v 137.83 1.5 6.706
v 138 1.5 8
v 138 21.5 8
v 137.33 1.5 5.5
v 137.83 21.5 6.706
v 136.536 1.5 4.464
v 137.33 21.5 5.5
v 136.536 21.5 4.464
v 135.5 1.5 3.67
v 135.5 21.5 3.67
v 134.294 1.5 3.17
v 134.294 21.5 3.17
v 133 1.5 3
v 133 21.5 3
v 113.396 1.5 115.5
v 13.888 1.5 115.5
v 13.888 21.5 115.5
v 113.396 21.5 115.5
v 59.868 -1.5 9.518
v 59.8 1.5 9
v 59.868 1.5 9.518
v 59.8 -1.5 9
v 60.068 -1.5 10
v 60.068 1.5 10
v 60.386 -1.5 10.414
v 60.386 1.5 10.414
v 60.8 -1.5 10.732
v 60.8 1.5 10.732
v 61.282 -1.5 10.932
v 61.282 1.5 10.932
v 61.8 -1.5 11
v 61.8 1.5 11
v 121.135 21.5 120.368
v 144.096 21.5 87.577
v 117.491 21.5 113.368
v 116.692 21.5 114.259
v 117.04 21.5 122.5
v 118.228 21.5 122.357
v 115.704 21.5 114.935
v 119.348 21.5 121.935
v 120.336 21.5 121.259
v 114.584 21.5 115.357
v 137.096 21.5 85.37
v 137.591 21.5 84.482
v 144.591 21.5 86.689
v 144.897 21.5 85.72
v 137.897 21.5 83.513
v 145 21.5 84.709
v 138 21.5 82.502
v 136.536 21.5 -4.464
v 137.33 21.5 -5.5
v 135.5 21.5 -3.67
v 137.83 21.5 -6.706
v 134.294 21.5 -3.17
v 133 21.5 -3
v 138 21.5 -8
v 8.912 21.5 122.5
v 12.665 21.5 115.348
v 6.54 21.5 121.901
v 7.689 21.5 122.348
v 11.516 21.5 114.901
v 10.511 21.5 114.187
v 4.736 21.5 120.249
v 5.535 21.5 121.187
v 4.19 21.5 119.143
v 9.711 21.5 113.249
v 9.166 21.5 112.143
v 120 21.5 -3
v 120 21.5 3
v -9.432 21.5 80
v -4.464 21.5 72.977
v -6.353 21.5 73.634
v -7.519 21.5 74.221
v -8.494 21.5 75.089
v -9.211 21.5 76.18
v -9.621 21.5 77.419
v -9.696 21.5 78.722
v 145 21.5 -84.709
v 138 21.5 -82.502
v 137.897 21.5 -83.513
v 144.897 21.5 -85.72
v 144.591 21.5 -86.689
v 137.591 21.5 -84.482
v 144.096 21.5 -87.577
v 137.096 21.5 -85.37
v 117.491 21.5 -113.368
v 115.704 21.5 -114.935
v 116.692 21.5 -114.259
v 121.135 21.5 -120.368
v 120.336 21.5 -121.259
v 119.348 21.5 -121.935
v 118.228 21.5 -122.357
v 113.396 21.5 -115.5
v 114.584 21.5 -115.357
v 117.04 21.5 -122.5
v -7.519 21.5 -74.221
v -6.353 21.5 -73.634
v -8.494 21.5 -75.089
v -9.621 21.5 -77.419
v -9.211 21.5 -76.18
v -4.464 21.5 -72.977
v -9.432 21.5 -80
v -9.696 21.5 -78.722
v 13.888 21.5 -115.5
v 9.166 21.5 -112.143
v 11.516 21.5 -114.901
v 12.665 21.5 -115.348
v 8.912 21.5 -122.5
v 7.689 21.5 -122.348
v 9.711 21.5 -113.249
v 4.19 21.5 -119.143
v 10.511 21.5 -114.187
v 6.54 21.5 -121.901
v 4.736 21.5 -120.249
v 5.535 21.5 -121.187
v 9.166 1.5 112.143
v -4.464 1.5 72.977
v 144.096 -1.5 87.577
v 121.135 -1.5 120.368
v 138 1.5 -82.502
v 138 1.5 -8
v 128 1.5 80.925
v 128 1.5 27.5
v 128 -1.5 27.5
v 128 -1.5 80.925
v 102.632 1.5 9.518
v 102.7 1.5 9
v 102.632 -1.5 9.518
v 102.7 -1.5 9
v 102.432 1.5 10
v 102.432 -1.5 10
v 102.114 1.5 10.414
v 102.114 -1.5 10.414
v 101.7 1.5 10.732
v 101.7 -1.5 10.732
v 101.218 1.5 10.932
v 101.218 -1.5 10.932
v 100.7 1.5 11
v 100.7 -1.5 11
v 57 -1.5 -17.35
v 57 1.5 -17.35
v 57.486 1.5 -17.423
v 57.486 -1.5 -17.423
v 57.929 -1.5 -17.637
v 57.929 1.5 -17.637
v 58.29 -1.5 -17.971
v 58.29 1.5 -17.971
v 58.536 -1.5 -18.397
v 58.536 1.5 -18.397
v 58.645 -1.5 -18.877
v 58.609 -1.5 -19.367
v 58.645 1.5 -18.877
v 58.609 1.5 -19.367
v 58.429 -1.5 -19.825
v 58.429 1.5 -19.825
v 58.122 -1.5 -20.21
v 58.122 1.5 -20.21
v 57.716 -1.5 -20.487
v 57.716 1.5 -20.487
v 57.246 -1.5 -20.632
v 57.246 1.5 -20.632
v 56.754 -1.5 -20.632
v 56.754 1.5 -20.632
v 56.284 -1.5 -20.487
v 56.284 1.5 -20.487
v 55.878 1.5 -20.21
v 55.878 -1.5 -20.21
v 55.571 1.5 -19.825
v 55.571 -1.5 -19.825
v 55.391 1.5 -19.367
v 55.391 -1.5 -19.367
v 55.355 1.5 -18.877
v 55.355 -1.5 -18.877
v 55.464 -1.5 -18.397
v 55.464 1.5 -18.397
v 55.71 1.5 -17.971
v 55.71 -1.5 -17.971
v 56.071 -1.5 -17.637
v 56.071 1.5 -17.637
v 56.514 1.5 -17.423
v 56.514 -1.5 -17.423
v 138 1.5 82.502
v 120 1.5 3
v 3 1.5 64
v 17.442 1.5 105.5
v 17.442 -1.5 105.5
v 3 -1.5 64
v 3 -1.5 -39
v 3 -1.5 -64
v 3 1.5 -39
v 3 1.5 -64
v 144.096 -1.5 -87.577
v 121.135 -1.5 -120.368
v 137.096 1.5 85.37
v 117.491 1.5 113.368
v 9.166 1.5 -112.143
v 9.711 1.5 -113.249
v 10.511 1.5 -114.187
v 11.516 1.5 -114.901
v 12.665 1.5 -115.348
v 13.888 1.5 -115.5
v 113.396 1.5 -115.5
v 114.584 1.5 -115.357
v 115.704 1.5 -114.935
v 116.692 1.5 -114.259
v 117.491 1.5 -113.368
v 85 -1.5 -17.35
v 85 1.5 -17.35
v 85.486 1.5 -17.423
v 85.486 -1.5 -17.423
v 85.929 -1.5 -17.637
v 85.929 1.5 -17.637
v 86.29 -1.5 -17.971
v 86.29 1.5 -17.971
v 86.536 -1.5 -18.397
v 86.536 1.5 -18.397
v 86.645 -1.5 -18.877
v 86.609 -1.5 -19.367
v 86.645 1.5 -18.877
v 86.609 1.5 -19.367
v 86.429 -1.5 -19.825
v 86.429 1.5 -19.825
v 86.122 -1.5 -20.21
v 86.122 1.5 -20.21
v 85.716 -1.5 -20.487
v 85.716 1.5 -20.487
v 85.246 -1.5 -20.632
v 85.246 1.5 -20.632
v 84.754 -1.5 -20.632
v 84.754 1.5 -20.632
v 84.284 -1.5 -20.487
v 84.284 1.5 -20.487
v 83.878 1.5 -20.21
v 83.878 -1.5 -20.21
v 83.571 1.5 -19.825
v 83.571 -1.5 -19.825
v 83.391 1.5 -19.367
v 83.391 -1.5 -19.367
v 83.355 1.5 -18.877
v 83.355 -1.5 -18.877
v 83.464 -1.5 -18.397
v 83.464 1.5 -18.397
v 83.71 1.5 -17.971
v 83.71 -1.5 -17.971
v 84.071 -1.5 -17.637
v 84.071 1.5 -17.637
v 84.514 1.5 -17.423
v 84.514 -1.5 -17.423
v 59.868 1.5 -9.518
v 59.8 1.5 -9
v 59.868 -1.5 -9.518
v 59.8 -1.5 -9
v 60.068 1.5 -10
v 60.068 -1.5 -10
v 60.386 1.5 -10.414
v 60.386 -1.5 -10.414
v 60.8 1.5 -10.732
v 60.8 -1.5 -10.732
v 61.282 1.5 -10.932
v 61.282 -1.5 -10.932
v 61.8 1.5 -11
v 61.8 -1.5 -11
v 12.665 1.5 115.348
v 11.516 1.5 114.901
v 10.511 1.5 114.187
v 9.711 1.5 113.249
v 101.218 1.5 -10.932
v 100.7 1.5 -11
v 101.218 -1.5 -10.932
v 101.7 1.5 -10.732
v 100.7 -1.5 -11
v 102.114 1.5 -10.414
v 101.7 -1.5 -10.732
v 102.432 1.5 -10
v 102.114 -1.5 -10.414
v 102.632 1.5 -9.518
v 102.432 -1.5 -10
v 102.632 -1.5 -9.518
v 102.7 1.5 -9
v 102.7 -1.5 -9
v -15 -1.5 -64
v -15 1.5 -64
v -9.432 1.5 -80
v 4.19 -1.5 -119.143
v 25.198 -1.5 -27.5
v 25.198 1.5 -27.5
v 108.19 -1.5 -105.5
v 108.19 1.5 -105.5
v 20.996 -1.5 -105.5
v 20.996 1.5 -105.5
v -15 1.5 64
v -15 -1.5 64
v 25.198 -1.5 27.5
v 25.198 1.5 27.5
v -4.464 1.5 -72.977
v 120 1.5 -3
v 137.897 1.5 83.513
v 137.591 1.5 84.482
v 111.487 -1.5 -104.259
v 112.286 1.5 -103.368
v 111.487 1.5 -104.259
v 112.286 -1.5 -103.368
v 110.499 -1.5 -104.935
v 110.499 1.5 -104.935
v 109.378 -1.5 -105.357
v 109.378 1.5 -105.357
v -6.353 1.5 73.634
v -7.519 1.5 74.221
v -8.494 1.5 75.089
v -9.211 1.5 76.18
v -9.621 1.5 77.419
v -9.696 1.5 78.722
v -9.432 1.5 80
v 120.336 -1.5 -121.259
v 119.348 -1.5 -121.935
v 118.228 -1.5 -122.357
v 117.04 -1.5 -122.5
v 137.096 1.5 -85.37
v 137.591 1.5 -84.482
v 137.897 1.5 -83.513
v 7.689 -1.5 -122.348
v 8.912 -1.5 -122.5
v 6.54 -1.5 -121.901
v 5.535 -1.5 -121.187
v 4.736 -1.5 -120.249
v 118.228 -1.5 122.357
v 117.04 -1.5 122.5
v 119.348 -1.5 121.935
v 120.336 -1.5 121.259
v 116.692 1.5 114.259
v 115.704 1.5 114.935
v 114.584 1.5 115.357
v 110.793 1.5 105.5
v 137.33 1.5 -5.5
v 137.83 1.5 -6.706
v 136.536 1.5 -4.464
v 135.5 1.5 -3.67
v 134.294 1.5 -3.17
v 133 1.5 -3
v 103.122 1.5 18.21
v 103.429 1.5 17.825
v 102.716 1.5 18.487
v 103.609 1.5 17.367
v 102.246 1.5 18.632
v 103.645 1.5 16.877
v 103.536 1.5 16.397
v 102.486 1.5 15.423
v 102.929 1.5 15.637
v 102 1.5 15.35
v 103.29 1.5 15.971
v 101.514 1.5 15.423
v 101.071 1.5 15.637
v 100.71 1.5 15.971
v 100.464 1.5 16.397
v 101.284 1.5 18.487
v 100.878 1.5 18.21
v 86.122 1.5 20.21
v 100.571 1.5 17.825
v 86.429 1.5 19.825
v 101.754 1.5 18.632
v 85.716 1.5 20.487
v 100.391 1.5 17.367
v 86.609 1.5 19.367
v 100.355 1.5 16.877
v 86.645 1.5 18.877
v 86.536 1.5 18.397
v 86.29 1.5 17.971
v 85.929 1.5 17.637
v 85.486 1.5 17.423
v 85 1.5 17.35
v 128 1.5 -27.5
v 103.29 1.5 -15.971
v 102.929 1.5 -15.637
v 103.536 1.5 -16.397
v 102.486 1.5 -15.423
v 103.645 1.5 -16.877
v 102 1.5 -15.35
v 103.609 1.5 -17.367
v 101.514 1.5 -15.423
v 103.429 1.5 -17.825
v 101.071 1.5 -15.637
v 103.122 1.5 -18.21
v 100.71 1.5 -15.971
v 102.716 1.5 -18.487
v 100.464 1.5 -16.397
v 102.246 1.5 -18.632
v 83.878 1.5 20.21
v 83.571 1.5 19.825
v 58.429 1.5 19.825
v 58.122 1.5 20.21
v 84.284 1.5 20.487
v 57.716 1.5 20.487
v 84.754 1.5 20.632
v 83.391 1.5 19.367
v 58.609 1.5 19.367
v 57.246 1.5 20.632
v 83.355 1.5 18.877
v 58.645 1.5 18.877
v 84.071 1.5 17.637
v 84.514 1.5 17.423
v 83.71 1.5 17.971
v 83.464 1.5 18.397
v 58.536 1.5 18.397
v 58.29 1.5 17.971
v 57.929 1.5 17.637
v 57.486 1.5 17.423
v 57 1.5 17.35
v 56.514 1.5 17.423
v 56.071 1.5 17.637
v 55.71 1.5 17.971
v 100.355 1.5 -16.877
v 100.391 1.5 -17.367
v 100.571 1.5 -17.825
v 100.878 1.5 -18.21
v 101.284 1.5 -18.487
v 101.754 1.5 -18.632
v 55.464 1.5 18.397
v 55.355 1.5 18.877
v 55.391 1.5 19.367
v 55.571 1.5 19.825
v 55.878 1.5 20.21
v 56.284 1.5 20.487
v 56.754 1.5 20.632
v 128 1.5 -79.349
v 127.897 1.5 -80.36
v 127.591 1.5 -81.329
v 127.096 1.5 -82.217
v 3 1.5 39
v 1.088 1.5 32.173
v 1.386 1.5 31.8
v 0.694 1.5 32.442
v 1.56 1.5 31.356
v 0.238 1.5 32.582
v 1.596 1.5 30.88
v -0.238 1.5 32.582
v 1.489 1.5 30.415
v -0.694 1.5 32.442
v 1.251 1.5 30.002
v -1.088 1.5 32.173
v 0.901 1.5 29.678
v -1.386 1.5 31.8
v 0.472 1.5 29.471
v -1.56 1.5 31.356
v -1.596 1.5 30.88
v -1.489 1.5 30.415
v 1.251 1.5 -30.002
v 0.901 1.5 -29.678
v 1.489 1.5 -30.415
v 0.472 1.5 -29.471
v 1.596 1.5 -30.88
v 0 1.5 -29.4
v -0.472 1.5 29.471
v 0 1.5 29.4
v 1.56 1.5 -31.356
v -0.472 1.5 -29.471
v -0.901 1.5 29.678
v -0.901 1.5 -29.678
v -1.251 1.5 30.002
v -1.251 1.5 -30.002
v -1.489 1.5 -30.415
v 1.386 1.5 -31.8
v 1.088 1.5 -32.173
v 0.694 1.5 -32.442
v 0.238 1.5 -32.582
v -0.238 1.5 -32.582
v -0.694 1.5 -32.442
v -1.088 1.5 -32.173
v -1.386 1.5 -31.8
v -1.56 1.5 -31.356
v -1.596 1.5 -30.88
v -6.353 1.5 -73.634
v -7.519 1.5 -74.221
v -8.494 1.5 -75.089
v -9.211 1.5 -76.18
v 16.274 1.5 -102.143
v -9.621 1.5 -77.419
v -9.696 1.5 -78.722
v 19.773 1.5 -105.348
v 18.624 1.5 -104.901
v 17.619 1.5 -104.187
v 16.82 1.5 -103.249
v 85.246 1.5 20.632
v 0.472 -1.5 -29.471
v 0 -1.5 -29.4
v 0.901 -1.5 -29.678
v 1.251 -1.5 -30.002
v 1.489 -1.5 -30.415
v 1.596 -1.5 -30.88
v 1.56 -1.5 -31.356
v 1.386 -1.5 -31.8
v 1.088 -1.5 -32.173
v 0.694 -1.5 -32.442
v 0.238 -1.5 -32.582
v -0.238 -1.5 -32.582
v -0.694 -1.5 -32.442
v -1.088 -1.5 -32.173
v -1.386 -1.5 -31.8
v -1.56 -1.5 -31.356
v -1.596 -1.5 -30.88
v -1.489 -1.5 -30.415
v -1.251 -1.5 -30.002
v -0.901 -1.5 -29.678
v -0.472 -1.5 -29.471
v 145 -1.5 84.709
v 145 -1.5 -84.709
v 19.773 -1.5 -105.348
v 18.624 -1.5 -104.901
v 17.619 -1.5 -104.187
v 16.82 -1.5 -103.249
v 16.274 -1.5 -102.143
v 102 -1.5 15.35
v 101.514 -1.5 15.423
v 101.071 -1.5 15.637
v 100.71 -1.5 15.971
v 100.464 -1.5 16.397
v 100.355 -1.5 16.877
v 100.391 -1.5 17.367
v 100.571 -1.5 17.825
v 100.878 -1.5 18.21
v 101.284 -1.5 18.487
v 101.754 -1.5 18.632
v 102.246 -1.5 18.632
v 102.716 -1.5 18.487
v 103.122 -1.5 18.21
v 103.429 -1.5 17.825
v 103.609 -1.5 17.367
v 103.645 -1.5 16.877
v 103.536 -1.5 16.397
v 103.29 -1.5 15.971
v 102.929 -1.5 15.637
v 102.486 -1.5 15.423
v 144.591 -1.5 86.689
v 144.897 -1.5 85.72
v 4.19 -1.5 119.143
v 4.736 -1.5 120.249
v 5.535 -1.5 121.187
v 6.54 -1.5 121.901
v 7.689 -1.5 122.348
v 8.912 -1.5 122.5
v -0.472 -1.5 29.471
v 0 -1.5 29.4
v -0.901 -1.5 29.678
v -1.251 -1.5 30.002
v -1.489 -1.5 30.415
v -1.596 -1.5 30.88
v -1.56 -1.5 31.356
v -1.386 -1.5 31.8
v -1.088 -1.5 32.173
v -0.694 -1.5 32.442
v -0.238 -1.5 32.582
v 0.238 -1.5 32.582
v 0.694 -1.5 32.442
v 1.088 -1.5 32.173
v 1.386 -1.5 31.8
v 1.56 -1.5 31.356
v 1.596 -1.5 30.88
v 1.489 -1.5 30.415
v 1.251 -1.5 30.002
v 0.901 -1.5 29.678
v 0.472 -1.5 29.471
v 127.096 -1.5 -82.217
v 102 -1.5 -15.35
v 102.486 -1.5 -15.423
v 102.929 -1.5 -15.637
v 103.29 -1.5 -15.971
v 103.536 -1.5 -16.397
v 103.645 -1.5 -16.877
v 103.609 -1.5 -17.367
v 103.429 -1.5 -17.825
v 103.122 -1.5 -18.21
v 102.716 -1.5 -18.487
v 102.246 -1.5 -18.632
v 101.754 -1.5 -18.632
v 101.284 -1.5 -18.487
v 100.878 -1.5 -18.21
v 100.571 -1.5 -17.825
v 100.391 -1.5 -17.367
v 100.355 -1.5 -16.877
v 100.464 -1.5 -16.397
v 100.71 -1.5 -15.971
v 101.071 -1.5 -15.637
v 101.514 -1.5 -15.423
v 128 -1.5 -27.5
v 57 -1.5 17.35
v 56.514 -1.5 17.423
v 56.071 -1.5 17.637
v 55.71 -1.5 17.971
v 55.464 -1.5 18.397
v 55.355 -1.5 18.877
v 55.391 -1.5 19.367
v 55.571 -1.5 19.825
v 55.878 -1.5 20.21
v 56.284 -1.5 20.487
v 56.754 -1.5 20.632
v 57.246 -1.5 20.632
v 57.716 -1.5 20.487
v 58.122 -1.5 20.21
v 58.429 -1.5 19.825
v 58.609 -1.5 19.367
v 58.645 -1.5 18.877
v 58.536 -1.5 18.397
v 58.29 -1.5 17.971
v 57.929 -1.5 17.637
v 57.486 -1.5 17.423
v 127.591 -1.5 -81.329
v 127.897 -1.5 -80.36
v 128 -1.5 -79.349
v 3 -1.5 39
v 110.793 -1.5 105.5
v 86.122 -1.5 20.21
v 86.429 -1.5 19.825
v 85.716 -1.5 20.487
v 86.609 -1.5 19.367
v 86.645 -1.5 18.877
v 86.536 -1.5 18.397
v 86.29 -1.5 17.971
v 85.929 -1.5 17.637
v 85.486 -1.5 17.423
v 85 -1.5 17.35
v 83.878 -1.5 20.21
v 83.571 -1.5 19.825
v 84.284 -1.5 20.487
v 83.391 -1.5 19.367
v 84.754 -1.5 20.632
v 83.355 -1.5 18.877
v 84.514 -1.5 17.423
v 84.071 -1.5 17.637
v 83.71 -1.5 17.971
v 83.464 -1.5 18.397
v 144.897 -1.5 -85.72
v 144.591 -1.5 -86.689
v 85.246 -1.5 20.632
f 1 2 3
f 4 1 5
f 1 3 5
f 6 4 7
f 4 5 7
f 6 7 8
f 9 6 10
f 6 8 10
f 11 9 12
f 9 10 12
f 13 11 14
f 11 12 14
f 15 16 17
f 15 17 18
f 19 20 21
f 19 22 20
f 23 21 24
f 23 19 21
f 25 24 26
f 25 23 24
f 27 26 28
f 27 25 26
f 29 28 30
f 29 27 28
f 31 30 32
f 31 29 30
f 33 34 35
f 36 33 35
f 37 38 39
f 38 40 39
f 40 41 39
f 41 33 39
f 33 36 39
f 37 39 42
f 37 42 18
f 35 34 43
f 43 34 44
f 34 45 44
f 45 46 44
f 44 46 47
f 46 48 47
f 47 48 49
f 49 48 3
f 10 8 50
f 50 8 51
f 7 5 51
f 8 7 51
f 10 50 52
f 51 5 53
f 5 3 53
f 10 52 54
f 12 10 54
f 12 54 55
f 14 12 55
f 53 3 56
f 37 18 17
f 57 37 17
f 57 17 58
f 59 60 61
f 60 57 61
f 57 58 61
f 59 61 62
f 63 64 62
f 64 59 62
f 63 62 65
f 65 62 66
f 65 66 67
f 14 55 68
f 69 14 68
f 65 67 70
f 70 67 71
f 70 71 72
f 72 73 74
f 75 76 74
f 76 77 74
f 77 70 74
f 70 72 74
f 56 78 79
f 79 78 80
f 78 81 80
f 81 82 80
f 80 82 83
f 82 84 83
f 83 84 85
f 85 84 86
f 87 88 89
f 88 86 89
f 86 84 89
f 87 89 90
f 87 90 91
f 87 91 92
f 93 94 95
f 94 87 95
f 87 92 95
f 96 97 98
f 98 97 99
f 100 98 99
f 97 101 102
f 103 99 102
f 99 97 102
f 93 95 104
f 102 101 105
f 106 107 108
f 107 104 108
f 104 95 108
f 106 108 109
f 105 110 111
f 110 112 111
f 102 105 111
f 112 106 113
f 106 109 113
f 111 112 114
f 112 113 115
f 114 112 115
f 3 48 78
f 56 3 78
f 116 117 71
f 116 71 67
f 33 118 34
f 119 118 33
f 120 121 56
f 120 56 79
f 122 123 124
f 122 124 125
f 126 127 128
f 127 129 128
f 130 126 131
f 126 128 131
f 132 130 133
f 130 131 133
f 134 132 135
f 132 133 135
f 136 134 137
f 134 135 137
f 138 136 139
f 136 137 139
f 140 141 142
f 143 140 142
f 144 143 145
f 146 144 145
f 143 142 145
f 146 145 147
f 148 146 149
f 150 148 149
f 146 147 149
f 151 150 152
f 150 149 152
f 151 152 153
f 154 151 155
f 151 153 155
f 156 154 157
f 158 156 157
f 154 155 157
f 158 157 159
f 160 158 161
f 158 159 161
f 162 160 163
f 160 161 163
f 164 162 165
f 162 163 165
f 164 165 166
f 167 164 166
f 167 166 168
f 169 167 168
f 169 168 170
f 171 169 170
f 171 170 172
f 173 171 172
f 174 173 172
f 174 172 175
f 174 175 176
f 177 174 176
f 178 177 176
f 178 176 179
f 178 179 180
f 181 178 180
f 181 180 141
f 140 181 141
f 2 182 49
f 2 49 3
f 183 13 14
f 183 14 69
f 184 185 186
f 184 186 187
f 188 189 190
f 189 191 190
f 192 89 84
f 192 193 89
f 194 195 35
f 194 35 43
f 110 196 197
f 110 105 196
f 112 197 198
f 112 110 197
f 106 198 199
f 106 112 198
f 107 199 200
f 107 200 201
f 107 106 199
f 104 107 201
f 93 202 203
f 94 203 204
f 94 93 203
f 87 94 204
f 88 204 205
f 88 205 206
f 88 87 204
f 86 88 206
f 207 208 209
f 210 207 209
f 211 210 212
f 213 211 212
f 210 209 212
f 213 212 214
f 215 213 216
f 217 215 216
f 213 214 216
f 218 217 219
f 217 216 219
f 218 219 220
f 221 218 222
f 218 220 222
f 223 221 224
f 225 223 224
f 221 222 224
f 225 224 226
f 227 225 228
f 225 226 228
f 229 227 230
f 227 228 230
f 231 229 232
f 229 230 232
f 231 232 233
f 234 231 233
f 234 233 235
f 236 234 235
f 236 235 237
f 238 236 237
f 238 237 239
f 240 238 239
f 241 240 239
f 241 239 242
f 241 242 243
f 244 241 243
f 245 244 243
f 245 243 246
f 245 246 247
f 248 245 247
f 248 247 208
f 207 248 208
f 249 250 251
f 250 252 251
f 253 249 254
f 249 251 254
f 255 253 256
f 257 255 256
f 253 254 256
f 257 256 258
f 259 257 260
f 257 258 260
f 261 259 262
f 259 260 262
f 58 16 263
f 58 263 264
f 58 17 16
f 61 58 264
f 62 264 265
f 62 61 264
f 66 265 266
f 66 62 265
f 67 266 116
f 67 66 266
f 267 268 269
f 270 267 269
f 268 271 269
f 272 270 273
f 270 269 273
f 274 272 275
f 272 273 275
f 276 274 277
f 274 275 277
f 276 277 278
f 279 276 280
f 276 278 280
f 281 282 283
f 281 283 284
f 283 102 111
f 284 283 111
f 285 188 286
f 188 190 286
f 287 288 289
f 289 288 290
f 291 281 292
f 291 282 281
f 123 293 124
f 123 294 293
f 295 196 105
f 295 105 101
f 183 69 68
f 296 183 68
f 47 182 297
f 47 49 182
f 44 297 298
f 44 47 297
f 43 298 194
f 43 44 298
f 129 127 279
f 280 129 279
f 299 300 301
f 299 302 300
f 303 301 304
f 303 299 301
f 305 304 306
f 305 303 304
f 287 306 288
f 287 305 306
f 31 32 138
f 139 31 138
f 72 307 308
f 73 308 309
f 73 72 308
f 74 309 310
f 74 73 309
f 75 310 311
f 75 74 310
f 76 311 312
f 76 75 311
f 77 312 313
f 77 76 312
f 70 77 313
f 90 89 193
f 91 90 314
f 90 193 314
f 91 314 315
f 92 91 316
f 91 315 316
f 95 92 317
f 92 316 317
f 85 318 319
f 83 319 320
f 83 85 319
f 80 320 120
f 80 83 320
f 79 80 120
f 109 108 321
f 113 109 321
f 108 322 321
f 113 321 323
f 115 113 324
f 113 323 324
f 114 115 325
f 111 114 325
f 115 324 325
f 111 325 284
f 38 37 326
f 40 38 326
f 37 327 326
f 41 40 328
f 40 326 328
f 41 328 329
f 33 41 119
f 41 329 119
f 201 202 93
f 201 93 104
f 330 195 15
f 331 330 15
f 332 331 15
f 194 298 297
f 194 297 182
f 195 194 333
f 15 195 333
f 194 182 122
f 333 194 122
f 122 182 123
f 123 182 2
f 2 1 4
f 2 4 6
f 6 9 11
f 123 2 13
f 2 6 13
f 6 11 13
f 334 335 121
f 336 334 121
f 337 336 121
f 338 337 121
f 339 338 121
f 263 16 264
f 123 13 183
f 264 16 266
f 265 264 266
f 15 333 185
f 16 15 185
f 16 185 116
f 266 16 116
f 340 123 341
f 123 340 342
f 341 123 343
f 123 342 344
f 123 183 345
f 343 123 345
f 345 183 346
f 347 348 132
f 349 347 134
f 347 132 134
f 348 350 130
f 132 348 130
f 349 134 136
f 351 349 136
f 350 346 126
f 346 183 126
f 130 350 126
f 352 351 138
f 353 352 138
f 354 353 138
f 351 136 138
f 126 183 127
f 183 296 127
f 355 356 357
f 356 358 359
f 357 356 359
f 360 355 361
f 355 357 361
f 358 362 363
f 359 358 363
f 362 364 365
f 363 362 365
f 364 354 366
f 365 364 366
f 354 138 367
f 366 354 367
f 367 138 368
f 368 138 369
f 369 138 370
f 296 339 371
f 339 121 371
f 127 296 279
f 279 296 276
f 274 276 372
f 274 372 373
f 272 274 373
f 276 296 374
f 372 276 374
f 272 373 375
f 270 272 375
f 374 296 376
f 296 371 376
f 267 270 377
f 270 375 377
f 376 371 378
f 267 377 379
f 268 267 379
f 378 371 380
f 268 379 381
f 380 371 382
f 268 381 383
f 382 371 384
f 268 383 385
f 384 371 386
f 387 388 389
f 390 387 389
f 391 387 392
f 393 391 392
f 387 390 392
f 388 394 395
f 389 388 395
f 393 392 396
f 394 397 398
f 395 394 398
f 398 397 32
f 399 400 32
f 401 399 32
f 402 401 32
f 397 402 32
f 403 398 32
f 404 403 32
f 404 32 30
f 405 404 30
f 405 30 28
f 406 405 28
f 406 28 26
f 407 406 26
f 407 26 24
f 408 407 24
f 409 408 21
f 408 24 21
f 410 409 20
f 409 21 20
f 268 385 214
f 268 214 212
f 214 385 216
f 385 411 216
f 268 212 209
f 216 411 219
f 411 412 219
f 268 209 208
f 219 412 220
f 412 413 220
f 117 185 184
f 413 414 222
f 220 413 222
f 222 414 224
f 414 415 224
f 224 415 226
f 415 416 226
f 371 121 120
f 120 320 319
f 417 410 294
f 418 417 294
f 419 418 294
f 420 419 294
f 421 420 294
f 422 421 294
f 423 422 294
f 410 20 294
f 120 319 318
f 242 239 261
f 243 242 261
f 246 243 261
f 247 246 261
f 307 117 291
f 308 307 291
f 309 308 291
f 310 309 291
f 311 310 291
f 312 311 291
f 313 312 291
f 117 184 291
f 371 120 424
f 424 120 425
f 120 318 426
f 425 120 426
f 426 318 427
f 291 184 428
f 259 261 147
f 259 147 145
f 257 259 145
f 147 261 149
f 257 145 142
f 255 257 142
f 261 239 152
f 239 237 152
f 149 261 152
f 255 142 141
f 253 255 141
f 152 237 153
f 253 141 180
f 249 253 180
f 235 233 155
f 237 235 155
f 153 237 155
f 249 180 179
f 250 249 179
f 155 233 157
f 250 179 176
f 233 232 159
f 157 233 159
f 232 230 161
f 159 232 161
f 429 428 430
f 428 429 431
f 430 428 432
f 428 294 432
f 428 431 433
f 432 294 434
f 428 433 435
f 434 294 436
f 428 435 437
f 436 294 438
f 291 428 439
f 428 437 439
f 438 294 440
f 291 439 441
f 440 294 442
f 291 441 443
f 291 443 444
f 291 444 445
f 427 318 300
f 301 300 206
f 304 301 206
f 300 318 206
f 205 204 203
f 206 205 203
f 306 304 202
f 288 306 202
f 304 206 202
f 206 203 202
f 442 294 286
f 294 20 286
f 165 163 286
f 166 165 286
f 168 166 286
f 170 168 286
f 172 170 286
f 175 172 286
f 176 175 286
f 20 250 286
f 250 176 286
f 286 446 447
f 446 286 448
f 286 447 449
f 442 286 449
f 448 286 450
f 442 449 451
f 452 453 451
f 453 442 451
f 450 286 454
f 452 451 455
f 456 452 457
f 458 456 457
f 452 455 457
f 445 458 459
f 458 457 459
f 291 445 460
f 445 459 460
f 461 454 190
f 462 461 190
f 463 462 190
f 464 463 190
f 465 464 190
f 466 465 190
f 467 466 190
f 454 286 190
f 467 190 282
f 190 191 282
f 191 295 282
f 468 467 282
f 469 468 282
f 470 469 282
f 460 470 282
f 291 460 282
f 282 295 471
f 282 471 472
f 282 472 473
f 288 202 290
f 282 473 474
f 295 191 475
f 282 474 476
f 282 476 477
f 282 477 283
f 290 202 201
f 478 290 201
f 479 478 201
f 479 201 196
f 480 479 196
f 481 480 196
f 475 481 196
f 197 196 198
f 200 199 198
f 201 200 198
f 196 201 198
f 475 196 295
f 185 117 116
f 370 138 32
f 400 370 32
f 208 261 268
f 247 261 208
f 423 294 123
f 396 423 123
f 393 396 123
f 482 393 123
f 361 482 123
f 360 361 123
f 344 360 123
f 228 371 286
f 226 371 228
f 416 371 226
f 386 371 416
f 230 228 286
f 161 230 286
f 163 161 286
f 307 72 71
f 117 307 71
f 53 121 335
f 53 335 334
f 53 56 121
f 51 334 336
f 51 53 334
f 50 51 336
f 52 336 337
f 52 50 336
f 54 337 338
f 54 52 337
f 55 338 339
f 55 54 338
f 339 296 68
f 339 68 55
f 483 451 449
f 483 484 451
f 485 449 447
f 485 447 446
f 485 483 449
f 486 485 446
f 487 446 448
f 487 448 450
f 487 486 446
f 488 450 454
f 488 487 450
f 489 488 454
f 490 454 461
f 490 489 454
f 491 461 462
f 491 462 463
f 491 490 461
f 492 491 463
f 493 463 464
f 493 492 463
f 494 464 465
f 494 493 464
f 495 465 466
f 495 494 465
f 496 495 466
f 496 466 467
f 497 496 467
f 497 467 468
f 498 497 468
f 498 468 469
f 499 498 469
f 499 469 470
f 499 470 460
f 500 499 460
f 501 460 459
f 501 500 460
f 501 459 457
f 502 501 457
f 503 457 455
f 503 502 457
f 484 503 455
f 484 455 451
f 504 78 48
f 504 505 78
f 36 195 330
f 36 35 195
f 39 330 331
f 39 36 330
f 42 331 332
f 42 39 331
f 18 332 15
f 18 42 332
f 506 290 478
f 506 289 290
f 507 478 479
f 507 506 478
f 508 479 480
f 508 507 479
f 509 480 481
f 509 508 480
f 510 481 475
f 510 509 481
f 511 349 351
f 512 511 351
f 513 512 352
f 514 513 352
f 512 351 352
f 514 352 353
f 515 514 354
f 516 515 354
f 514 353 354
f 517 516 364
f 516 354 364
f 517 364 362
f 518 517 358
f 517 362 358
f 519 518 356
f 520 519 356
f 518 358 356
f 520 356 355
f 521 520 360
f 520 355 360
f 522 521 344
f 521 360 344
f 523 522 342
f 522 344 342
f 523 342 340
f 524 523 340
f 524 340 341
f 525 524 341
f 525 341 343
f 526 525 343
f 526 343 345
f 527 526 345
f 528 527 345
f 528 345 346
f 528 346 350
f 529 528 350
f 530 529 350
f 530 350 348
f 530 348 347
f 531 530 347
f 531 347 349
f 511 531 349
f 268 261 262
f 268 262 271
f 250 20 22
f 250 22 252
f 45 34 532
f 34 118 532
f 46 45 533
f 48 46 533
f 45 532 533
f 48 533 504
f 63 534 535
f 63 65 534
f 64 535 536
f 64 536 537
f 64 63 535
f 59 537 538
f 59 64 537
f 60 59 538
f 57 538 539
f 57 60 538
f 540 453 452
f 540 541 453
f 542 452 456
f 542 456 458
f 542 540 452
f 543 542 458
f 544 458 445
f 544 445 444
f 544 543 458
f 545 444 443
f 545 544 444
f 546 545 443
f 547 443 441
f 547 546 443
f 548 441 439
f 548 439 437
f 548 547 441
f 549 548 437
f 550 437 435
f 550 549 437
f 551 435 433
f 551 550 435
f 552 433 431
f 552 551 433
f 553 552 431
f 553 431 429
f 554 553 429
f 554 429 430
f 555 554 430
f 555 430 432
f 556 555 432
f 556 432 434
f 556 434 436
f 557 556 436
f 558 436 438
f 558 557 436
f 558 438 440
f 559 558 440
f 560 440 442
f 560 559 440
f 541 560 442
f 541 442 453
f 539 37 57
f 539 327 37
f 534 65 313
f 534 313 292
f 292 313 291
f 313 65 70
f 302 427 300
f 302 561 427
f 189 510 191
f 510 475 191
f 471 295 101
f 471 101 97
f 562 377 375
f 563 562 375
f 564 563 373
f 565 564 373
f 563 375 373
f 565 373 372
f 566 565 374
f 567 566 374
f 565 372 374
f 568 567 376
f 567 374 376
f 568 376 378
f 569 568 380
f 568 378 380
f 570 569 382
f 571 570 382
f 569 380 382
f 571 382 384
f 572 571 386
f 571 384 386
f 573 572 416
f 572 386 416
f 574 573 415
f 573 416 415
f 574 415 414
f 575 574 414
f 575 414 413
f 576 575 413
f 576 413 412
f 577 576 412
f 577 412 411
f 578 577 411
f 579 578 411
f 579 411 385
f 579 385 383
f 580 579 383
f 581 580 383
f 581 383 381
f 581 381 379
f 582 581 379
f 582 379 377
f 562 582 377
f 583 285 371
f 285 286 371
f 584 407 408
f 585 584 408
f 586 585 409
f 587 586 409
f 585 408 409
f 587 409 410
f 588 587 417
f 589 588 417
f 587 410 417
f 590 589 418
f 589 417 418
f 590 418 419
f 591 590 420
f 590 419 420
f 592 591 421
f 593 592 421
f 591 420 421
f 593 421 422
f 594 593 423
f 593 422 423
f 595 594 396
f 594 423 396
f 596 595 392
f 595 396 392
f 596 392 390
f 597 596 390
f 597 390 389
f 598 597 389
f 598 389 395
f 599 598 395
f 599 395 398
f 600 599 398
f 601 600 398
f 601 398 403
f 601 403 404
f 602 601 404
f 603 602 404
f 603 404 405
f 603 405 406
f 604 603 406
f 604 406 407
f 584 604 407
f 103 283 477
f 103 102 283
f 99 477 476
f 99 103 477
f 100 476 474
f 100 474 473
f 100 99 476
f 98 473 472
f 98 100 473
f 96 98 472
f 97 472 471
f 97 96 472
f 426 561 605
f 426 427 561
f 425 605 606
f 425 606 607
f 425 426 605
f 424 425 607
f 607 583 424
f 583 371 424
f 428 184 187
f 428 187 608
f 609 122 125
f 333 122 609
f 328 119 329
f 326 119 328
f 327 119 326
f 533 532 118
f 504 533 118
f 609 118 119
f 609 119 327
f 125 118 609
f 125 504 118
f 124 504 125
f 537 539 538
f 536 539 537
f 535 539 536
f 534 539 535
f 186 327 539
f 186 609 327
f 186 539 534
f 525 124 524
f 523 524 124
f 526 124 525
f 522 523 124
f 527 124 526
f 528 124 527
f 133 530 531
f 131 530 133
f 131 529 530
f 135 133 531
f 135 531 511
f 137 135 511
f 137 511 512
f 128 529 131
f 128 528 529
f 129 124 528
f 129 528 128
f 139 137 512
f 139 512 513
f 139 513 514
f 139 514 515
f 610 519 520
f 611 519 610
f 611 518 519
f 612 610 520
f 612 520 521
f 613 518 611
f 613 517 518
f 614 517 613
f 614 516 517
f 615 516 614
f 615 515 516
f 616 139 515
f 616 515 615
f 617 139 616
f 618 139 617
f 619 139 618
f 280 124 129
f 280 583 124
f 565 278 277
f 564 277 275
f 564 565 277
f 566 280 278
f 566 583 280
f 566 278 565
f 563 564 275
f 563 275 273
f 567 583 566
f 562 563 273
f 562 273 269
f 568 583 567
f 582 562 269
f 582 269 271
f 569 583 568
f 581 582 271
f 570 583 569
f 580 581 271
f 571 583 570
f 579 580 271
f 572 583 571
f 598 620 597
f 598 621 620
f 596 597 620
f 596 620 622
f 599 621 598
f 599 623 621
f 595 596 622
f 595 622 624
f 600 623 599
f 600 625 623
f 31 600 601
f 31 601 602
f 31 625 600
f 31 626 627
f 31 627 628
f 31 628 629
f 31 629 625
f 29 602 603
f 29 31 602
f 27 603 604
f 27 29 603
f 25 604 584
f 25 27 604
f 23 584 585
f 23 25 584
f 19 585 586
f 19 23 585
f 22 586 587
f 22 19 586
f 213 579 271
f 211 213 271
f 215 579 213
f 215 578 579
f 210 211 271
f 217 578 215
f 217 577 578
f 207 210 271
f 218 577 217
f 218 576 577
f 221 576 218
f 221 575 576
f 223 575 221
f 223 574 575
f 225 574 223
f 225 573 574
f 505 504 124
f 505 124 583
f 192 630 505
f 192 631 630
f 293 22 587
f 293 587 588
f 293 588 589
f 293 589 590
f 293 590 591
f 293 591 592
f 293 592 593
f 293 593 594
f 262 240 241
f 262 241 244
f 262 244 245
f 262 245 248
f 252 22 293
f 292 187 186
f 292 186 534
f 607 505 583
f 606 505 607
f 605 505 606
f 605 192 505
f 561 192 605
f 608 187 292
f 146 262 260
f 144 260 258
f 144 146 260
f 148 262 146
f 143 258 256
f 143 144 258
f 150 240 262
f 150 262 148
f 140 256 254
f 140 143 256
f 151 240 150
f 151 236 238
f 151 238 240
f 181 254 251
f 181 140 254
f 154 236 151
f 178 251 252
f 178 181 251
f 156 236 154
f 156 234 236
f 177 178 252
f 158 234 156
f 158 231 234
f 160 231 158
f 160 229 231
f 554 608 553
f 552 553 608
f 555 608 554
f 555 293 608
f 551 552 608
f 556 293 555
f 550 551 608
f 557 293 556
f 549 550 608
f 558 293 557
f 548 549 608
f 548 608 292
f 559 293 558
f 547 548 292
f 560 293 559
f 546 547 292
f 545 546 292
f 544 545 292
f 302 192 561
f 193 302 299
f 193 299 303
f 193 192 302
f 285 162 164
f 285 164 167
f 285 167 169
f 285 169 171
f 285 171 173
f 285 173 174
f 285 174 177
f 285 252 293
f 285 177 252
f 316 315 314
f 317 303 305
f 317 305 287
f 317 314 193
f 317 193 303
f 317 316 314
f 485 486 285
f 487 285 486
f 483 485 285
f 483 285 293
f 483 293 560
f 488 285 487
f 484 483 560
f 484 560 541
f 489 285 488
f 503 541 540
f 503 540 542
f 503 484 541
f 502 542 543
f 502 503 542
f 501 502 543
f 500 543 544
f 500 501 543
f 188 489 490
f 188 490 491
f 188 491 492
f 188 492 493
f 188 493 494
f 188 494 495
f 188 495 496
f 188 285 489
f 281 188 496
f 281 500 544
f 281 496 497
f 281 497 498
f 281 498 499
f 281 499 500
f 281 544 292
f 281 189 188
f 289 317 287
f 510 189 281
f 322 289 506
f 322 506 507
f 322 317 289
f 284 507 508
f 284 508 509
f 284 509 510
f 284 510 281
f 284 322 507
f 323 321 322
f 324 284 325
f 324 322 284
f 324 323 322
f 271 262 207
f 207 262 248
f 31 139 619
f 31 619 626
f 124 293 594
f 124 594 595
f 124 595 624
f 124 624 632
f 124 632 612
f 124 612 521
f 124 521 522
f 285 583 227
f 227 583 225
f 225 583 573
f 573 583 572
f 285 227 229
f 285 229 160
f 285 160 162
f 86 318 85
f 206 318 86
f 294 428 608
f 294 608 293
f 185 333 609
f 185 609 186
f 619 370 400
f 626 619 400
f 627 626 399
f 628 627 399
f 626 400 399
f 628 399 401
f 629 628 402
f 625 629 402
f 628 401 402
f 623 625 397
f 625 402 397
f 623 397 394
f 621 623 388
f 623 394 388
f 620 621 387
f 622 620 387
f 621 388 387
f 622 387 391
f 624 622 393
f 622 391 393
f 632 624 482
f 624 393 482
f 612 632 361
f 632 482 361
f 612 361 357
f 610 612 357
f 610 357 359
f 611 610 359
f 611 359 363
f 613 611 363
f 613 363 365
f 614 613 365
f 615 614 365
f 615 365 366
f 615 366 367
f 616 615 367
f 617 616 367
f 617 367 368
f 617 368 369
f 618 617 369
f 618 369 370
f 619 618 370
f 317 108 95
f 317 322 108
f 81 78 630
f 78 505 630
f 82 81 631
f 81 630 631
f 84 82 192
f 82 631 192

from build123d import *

# Parameters (mm, degrees)
SKETCH1_R           = 1.5999999999999992
SKETCH1_R_2         = 1.6
BOSS_EXTRUDE1_DEPTH = 1.5
BOSS_EXTRUDE2_DEPTH = 20
FILLET1_R           = 5
SKETCH2_R           = 1.6500000000000017
SKETCH2_W           = 42.900000000000006
SKETCH2_H           = 21.999999999999993
CUT_EXTRUDE1_DEPTH  = 191.86971996626394
FILLET2_R           = 2


with BuildPart() as part:
    # Sketch1 → Boss-Extrude1 (new, symmetric)
    with BuildSketch(Plane(origin=(0, 0, 0), x_dir=(1, 0, 0), z_dir=(0, 1, 0))):
        Polygon((-15, -39), (-15, 39), (-14.999999999999993, 64), (5.358274547724965, 122.5), (119.64234676884817, 122.50000000000003), (145.00000000000003, 86.28551808227317), (145.00000000000003, -86.28551808227317), (119.64234676884817, -122.50000000000003), (5.358274547725049, -122.49999999999999), (-14.999999999999993, -64), align=None)
        with Locations(Location((0, 31, 0), (0, 0, 270))):
            Circle(SKETCH1_R, mode=Mode.SUBTRACT)
        with Locations(Location((0, -31, 0), (0, 0, 90))):
            Circle(SKETCH1_R_2, mode=Mode.SUBTRACT)
        Polygon((25.197972880423116, 27.499999999999996), (128, 27.499999999999996), (128, 80.92543867133034), (110.7927069094685, 105.50000000000004), (17.442194764625423, 105.50000000000001), (3.0000000000000027, 64), (3.0000000000000027, 39), align=None, mode=Mode.SUBTRACT)
        Polygon((25.197972880423116, -27.499999999999996), (128, -27.499999999999996), (128, -80.92543867133034), (110.7927069094685, -105.50000000000004), (17.442194764625537, -105.49999999999999), (3.0000000000000027, -64), (3.0000000000000027, -39), align=None, mode=Mode.SUBTRACT)
    extrude(amount=BOSS_EXTRUDE1_DEPTH, both=True)

    # Sketch3 → Boss-Extrude2 (add)
    with BuildSketch(Plane(origin=(0, 1.5, 0), x_dir=(1, 0, 0), z_dir=(0, 1, 0))):
        Polygon((120.00000000000004, -2.999999999999993), (120.00000000000004, 3.0000000000000075), (138, 3.0000000000000075), (138, 84.07842656012029), (115.99837741498601, 115.49999999999999), (10.334006401742785, 115.49999999999997), (-4.464169294218266, 72.97708008435012), (-11.07528040532939, 75.27777777777771), (5.358274547724965, 122.5), (119.64234676884817, 122.50000000000003), (145.00000000000003, 86.28551808227317), (145.00000000000003, -86.28551808227317), (119.64234676884817, -122.50000000000003), (5.358274547724965, -122.5), (-11.075280405329384, -75.27777777777771), (-4.464169294218257, -72.97708008435012), (10.334006401742798, -115.49999999999997), (115.99837741498602, -115.49999999999996), (138, -84.07842656012026), (138, -2.999999999999991), align=None)
    extrude(amount=BOSS_EXTRUDE2_DEPTH)

    # Fillet1
    fillet1_edges = [part.edges().sort_by_distance(p)[0] for p in [
        (115.99837741498602, 11.5, 115.49999999999996),
        (10.334006401742798, 11.5, 115.49999999999997),
        (-11.075280405329384, 11.5, 75.27777777777771),
        (-11.07528040532939, 11.5, -75.27777777777771),
        (10.334006401742785, 11.5, -115.49999999999997),
        (115.99837741498601, 11.5, -115.49999999999999),
        (138, 11.5, -84.07842656012029),
        (5.358274547724965, 10, -122.5),
        (119.64234676884817, 10, -122.50000000000003),
        (145.00000000000003, 10, -86.28551808227317),
        (145.00000000000003, 10, 86.28551808227317),
        (119.64234676884817, 10, 122.50000000000003),
        (5.358274547725006, 10, 122.5),
        (128, 0, -80.92543867133034),
        (110.7927069094685, 0, -105.50000000000004),
        (17.442194764625423, 0, -105.50000000000001),
        (138, 11.5, -3.0000000000000075),
        (138, 11.5, 2.999999999999991),
        (138, 11.5, 84.07842656012026),
    ]]
    fillet(fillet1_edges, radius=FILLET1_R)

    # Sketch2 → Cut-Extrude1 (cut, through all)
    with BuildSketch(Plane(origin=(0, 1.5, 0), x_dir=(1, 0, 0), z_dir=(0, 1, 0))):
        with Locations(Location((56.999999999999964, 18.99999999999999, 0), (0, 0, 270))):
            Circle(SKETCH2_R)
        with Locations(Location((84.99999999999997, 18.999999999999993, 0), (0, 0, 270))):
            Circle(SKETCH2_R)
        with Locations(Location((101.99999999999999, 16.999999999999996, 0), (0, 0, 270))):
            Circle(SKETCH2_R)
        with Locations(Location((101.99999999999999, -16.999999999999996, 0), (0, 0, 90))):
            Circle(SKETCH2_R)
        with Locations(Location((84.99999999999997, -18.999999999999993, 0), (0, 0, 90))):
            Circle(SKETCH2_R)
        with Locations(Location((56.999999999999964, -18.99999999999999, 0), (0, 0, 90))):
            Circle(SKETCH2_R)
        with Locations((81.24999999999999, 3.819e-14)):
            Rectangle(SKETCH2_W, SKETCH2_H)
    extrude(amount=-CUT_EXTRUDE1_DEPTH, mode=Mode.SUBTRACT)

    # Fillet2
    fillet2_edges = [part.edges().sort_by_distance(p)[0] for p in [
        (59.79999999999998, 0, -11.000000000000036),
        (102.69999999999999, 0, -11.000000000000036),
        (102.69999999999999, 0, 10.99999999999996),
        (59.79999999999998, 0, 10.99999999999996),
    ]]
    fillet(fillet2_edges, radius=FILLET2_R)


solid = part.part
